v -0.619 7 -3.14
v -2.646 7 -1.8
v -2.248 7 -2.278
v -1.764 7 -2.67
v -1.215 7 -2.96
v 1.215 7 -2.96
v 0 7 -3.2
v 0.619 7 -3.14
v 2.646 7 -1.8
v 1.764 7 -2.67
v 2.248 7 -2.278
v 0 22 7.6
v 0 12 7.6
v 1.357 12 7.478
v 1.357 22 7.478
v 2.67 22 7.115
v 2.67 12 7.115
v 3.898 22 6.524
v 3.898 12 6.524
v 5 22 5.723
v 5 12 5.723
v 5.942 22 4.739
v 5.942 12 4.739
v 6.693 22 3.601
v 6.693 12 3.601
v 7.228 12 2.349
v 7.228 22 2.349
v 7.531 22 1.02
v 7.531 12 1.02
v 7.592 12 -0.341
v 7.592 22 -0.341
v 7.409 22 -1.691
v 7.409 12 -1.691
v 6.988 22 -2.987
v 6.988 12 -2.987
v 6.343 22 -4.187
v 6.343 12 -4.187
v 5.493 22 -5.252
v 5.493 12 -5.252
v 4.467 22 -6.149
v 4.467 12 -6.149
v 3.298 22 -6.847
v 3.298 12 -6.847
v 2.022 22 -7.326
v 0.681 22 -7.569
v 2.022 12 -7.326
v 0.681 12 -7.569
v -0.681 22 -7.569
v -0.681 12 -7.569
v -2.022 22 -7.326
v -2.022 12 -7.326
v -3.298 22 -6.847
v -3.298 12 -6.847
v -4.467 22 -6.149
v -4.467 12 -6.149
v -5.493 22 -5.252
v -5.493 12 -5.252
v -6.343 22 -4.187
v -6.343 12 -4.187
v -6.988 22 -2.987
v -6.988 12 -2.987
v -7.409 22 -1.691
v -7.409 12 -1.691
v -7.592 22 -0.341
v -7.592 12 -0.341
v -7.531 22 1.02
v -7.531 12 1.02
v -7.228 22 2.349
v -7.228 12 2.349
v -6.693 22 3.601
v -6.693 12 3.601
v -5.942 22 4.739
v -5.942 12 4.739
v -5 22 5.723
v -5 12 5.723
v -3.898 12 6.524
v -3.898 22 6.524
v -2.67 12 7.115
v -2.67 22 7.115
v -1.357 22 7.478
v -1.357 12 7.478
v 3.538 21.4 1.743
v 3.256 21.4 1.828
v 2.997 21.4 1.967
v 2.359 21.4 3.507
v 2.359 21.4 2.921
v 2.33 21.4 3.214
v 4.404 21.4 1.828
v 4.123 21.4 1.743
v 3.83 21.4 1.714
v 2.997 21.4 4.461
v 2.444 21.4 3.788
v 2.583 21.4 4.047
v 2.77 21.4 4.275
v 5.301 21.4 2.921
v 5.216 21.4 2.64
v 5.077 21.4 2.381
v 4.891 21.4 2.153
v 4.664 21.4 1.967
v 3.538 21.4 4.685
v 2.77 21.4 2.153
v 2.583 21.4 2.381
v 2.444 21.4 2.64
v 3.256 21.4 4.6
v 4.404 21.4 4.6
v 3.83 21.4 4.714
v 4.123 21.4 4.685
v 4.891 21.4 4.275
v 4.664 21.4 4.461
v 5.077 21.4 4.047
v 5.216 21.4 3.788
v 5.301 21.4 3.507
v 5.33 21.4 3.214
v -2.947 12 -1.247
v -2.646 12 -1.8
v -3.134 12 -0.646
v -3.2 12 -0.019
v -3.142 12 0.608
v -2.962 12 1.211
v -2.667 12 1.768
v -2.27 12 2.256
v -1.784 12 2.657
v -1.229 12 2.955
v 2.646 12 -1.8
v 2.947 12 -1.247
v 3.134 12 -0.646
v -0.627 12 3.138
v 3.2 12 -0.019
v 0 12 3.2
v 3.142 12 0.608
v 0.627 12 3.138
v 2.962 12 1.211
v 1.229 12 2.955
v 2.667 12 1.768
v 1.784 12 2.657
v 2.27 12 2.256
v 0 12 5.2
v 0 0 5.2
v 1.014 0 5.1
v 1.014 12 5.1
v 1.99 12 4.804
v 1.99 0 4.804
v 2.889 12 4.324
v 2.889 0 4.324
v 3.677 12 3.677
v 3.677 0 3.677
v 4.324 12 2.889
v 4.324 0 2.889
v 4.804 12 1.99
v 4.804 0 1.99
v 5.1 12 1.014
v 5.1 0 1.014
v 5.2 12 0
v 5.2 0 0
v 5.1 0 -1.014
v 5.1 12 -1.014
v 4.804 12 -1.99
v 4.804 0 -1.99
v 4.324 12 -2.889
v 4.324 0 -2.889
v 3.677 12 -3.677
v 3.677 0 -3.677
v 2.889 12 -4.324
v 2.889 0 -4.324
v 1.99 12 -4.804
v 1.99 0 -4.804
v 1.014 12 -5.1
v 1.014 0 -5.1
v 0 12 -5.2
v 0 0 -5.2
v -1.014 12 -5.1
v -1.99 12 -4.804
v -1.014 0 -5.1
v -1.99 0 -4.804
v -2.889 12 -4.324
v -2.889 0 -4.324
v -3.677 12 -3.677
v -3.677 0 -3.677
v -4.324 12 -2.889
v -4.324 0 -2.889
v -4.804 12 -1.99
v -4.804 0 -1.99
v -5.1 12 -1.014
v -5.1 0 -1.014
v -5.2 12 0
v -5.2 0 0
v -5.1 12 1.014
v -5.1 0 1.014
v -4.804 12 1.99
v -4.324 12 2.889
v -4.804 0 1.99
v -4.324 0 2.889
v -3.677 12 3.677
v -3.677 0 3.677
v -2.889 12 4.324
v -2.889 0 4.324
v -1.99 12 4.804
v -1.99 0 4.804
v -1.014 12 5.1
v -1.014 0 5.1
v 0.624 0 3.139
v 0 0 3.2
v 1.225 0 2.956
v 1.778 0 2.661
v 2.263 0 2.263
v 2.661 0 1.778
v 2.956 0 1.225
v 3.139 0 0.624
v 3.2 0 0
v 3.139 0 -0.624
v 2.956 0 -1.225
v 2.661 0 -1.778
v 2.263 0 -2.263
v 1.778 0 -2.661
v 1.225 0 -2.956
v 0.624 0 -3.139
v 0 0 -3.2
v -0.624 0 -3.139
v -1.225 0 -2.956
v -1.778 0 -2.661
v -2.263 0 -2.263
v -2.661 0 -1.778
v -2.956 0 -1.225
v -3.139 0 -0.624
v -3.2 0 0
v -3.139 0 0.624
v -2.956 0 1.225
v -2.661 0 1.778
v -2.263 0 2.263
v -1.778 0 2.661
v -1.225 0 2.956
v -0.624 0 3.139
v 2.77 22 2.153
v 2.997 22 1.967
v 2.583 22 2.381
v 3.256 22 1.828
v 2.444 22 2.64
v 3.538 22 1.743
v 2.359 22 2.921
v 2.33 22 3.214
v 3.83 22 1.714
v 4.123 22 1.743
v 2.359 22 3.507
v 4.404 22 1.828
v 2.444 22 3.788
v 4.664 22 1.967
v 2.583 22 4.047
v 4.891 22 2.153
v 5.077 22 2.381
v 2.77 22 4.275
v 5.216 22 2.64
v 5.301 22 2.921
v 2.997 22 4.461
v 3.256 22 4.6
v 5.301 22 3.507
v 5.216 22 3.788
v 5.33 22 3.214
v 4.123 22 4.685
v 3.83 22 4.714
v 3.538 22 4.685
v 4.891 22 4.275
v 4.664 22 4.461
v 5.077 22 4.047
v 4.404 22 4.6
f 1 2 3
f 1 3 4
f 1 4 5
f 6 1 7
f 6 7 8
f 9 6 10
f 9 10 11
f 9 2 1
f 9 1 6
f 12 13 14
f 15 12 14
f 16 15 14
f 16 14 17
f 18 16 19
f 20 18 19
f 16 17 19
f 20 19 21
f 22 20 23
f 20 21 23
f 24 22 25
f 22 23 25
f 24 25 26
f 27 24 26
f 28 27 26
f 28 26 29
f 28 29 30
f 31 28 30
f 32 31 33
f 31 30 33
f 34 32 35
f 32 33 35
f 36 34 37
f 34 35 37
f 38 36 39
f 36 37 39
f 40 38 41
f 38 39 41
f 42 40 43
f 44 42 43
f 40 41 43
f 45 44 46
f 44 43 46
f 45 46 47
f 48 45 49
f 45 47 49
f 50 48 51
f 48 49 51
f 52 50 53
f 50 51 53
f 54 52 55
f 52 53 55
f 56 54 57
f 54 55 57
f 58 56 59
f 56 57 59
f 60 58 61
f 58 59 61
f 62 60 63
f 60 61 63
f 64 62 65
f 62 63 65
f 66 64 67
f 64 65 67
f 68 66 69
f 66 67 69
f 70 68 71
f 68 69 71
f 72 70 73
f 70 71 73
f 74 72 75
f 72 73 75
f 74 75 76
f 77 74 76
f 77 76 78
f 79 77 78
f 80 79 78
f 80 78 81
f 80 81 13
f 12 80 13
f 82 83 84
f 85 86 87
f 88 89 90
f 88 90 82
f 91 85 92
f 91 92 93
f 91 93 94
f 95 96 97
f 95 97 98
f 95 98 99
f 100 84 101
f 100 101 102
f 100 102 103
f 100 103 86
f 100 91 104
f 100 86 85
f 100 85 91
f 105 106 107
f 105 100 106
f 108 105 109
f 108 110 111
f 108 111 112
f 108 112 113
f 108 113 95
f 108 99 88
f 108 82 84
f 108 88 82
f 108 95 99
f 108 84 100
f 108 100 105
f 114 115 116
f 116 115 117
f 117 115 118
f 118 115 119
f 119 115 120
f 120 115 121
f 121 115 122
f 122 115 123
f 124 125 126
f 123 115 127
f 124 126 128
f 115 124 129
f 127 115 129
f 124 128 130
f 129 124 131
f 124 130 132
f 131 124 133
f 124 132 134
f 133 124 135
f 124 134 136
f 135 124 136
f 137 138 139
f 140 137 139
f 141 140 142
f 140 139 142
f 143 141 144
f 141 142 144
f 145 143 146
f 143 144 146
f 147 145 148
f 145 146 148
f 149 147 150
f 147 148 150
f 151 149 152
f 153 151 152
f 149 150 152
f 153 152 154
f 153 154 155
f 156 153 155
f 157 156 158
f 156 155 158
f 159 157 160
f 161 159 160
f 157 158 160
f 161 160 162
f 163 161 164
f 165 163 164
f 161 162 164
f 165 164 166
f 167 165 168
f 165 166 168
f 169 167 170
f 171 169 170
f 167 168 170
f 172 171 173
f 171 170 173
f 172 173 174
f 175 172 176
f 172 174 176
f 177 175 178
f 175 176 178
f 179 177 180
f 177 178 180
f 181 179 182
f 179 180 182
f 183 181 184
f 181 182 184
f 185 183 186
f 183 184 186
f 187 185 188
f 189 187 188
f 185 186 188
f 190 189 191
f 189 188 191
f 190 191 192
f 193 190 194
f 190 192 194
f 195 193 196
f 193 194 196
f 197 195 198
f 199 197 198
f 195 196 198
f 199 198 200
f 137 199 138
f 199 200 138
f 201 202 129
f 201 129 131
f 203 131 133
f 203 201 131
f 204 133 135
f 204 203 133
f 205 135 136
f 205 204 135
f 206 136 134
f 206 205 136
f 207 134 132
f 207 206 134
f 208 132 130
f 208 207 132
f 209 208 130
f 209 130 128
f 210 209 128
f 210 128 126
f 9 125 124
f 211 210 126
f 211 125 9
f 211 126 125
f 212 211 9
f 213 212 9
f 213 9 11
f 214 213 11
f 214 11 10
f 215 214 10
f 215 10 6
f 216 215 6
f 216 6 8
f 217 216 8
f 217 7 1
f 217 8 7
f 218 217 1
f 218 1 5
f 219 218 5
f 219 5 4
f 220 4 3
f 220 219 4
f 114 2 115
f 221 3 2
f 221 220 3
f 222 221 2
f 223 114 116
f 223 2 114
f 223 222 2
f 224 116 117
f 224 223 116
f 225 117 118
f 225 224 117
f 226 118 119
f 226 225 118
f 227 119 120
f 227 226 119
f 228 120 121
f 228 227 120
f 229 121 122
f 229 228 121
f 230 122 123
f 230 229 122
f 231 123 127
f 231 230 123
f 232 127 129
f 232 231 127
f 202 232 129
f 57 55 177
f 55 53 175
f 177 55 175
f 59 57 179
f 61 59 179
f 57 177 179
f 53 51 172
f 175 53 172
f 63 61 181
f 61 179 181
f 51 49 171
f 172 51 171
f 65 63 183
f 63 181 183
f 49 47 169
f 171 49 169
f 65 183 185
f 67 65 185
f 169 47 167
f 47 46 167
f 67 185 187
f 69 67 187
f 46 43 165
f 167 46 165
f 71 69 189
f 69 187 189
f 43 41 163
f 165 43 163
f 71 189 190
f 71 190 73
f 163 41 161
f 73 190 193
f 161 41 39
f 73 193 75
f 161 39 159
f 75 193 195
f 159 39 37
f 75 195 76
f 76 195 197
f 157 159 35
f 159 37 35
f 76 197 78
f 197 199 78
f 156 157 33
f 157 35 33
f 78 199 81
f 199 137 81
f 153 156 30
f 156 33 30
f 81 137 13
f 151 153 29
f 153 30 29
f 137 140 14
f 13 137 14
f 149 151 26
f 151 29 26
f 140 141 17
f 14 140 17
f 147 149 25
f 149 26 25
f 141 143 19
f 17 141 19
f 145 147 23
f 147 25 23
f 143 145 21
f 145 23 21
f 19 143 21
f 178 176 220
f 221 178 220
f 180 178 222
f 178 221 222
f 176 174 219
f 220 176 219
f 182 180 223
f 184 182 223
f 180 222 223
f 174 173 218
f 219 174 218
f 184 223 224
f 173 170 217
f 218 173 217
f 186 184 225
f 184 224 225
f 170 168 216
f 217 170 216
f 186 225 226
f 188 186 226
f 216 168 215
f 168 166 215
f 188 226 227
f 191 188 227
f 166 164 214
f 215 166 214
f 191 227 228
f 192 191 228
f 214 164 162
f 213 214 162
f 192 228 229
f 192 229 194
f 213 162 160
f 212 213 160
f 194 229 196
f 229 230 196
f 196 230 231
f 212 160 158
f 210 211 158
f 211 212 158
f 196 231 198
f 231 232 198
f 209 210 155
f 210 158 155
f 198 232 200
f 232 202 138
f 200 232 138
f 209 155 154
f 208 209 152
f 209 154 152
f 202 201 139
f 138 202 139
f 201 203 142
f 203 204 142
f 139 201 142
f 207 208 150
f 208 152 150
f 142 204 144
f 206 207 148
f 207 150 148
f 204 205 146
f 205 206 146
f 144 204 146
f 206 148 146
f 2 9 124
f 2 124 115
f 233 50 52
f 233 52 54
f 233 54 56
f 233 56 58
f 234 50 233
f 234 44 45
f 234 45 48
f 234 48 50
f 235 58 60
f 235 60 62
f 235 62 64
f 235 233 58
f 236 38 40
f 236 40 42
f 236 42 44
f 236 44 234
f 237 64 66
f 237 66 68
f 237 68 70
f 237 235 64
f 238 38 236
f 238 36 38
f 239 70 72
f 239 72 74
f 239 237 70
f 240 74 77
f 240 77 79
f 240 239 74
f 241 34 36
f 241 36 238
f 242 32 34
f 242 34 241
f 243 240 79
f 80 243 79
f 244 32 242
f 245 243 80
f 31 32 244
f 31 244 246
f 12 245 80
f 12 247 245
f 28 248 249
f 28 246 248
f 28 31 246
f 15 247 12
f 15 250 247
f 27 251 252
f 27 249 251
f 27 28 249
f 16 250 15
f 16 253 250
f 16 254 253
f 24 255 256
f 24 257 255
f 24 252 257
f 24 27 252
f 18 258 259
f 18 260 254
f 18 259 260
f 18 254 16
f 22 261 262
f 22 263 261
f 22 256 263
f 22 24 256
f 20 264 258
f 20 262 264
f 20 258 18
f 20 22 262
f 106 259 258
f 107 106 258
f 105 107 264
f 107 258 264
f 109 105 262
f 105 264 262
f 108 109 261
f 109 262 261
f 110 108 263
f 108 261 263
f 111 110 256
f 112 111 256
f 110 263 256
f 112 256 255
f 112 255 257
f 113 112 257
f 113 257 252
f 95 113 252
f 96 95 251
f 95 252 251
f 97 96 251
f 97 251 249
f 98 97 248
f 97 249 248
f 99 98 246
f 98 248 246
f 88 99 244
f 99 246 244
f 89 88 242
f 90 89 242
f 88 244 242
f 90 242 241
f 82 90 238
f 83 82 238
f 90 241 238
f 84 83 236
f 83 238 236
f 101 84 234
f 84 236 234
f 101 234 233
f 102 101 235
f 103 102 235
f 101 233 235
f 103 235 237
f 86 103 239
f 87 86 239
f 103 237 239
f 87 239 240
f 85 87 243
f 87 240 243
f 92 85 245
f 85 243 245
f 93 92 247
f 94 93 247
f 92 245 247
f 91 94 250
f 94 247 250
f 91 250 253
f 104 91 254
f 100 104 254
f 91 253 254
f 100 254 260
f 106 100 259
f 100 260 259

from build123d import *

# Parameters (mm, degrees)
SKETCH1_R           = 5.2
SKETCH1_R_2         = 3.2
BOSS_EXTRUDE1_DEPTH = 12
SKETCH2_R           = 7.6
BOSS_EXTRUDE2_DEPTH = 10
BOSS_EXTRUDE4_START = 5
BOSS_EXTRUDE4_DEPTH = 5
SKETCH5_R           = 1.5
CUT_EXTRUDE1_DEPTH  = 0.6


with BuildPart() as part:
    # Sketch1 → Boss-Extrude1 (new body)
    with BuildSketch(Plane(origin=(0, 0, 0), x_dir=(1, 0, 0), z_dir=(0, 1, 0))):
        with Locations(Location((0, 0, 0), (0, 0, 270))):
            Circle(SKETCH1_R)
        with Locations(Location((0, 0, 0), (0, 0, 270))):
            Circle(SKETCH1_R_2, mode=Mode.SUBTRACT)
    extrude(amount=BOSS_EXTRUDE1_DEPTH)

    # Sketch2 → Boss-Extrude2 (add)
    with BuildSketch(Plane(origin=(0, 12, 0), x_dir=(1, 0, 0), z_dir=(0, 1, 0))):
        with Locations(Location((0, 0, 0), (0, 0, 270))):
            Circle(SKETCH2_R)
    extrude(amount=BOSS_EXTRUDE2_DEPTH)

    # Sketch4 → Boss-Extrude4 (add)
    with BuildSketch(Plane.XZ.offset(-12).offset(BOSS_EXTRUDE4_START)):
        with BuildLine():
            Line((2.645751311, -1.8), (-2.645751311, -1.8))
            ThreePointArc((-2.645751311, -1.8), (0, -3.2), (2.645751311, -1.8))
        make_face()
    extrude(amount=-BOSS_EXTRUDE4_DEPTH)

    # Sketch5 → Cut-Extrude1 (cut)
    with BuildSketch(Plane(origin=(0, 22, 0), x_dir=(1, 0, 0), z_dir=(0, 1, 0))):
        with Locations(Location((3.830222216, -3.213938048, 0), (0, 0, 270))):
            Circle(SKETCH5_R)
    extrude(amount=-CUT_EXTRUDE1_DEPTH, mode=Mode.SUBTRACT)


solid = part.part
